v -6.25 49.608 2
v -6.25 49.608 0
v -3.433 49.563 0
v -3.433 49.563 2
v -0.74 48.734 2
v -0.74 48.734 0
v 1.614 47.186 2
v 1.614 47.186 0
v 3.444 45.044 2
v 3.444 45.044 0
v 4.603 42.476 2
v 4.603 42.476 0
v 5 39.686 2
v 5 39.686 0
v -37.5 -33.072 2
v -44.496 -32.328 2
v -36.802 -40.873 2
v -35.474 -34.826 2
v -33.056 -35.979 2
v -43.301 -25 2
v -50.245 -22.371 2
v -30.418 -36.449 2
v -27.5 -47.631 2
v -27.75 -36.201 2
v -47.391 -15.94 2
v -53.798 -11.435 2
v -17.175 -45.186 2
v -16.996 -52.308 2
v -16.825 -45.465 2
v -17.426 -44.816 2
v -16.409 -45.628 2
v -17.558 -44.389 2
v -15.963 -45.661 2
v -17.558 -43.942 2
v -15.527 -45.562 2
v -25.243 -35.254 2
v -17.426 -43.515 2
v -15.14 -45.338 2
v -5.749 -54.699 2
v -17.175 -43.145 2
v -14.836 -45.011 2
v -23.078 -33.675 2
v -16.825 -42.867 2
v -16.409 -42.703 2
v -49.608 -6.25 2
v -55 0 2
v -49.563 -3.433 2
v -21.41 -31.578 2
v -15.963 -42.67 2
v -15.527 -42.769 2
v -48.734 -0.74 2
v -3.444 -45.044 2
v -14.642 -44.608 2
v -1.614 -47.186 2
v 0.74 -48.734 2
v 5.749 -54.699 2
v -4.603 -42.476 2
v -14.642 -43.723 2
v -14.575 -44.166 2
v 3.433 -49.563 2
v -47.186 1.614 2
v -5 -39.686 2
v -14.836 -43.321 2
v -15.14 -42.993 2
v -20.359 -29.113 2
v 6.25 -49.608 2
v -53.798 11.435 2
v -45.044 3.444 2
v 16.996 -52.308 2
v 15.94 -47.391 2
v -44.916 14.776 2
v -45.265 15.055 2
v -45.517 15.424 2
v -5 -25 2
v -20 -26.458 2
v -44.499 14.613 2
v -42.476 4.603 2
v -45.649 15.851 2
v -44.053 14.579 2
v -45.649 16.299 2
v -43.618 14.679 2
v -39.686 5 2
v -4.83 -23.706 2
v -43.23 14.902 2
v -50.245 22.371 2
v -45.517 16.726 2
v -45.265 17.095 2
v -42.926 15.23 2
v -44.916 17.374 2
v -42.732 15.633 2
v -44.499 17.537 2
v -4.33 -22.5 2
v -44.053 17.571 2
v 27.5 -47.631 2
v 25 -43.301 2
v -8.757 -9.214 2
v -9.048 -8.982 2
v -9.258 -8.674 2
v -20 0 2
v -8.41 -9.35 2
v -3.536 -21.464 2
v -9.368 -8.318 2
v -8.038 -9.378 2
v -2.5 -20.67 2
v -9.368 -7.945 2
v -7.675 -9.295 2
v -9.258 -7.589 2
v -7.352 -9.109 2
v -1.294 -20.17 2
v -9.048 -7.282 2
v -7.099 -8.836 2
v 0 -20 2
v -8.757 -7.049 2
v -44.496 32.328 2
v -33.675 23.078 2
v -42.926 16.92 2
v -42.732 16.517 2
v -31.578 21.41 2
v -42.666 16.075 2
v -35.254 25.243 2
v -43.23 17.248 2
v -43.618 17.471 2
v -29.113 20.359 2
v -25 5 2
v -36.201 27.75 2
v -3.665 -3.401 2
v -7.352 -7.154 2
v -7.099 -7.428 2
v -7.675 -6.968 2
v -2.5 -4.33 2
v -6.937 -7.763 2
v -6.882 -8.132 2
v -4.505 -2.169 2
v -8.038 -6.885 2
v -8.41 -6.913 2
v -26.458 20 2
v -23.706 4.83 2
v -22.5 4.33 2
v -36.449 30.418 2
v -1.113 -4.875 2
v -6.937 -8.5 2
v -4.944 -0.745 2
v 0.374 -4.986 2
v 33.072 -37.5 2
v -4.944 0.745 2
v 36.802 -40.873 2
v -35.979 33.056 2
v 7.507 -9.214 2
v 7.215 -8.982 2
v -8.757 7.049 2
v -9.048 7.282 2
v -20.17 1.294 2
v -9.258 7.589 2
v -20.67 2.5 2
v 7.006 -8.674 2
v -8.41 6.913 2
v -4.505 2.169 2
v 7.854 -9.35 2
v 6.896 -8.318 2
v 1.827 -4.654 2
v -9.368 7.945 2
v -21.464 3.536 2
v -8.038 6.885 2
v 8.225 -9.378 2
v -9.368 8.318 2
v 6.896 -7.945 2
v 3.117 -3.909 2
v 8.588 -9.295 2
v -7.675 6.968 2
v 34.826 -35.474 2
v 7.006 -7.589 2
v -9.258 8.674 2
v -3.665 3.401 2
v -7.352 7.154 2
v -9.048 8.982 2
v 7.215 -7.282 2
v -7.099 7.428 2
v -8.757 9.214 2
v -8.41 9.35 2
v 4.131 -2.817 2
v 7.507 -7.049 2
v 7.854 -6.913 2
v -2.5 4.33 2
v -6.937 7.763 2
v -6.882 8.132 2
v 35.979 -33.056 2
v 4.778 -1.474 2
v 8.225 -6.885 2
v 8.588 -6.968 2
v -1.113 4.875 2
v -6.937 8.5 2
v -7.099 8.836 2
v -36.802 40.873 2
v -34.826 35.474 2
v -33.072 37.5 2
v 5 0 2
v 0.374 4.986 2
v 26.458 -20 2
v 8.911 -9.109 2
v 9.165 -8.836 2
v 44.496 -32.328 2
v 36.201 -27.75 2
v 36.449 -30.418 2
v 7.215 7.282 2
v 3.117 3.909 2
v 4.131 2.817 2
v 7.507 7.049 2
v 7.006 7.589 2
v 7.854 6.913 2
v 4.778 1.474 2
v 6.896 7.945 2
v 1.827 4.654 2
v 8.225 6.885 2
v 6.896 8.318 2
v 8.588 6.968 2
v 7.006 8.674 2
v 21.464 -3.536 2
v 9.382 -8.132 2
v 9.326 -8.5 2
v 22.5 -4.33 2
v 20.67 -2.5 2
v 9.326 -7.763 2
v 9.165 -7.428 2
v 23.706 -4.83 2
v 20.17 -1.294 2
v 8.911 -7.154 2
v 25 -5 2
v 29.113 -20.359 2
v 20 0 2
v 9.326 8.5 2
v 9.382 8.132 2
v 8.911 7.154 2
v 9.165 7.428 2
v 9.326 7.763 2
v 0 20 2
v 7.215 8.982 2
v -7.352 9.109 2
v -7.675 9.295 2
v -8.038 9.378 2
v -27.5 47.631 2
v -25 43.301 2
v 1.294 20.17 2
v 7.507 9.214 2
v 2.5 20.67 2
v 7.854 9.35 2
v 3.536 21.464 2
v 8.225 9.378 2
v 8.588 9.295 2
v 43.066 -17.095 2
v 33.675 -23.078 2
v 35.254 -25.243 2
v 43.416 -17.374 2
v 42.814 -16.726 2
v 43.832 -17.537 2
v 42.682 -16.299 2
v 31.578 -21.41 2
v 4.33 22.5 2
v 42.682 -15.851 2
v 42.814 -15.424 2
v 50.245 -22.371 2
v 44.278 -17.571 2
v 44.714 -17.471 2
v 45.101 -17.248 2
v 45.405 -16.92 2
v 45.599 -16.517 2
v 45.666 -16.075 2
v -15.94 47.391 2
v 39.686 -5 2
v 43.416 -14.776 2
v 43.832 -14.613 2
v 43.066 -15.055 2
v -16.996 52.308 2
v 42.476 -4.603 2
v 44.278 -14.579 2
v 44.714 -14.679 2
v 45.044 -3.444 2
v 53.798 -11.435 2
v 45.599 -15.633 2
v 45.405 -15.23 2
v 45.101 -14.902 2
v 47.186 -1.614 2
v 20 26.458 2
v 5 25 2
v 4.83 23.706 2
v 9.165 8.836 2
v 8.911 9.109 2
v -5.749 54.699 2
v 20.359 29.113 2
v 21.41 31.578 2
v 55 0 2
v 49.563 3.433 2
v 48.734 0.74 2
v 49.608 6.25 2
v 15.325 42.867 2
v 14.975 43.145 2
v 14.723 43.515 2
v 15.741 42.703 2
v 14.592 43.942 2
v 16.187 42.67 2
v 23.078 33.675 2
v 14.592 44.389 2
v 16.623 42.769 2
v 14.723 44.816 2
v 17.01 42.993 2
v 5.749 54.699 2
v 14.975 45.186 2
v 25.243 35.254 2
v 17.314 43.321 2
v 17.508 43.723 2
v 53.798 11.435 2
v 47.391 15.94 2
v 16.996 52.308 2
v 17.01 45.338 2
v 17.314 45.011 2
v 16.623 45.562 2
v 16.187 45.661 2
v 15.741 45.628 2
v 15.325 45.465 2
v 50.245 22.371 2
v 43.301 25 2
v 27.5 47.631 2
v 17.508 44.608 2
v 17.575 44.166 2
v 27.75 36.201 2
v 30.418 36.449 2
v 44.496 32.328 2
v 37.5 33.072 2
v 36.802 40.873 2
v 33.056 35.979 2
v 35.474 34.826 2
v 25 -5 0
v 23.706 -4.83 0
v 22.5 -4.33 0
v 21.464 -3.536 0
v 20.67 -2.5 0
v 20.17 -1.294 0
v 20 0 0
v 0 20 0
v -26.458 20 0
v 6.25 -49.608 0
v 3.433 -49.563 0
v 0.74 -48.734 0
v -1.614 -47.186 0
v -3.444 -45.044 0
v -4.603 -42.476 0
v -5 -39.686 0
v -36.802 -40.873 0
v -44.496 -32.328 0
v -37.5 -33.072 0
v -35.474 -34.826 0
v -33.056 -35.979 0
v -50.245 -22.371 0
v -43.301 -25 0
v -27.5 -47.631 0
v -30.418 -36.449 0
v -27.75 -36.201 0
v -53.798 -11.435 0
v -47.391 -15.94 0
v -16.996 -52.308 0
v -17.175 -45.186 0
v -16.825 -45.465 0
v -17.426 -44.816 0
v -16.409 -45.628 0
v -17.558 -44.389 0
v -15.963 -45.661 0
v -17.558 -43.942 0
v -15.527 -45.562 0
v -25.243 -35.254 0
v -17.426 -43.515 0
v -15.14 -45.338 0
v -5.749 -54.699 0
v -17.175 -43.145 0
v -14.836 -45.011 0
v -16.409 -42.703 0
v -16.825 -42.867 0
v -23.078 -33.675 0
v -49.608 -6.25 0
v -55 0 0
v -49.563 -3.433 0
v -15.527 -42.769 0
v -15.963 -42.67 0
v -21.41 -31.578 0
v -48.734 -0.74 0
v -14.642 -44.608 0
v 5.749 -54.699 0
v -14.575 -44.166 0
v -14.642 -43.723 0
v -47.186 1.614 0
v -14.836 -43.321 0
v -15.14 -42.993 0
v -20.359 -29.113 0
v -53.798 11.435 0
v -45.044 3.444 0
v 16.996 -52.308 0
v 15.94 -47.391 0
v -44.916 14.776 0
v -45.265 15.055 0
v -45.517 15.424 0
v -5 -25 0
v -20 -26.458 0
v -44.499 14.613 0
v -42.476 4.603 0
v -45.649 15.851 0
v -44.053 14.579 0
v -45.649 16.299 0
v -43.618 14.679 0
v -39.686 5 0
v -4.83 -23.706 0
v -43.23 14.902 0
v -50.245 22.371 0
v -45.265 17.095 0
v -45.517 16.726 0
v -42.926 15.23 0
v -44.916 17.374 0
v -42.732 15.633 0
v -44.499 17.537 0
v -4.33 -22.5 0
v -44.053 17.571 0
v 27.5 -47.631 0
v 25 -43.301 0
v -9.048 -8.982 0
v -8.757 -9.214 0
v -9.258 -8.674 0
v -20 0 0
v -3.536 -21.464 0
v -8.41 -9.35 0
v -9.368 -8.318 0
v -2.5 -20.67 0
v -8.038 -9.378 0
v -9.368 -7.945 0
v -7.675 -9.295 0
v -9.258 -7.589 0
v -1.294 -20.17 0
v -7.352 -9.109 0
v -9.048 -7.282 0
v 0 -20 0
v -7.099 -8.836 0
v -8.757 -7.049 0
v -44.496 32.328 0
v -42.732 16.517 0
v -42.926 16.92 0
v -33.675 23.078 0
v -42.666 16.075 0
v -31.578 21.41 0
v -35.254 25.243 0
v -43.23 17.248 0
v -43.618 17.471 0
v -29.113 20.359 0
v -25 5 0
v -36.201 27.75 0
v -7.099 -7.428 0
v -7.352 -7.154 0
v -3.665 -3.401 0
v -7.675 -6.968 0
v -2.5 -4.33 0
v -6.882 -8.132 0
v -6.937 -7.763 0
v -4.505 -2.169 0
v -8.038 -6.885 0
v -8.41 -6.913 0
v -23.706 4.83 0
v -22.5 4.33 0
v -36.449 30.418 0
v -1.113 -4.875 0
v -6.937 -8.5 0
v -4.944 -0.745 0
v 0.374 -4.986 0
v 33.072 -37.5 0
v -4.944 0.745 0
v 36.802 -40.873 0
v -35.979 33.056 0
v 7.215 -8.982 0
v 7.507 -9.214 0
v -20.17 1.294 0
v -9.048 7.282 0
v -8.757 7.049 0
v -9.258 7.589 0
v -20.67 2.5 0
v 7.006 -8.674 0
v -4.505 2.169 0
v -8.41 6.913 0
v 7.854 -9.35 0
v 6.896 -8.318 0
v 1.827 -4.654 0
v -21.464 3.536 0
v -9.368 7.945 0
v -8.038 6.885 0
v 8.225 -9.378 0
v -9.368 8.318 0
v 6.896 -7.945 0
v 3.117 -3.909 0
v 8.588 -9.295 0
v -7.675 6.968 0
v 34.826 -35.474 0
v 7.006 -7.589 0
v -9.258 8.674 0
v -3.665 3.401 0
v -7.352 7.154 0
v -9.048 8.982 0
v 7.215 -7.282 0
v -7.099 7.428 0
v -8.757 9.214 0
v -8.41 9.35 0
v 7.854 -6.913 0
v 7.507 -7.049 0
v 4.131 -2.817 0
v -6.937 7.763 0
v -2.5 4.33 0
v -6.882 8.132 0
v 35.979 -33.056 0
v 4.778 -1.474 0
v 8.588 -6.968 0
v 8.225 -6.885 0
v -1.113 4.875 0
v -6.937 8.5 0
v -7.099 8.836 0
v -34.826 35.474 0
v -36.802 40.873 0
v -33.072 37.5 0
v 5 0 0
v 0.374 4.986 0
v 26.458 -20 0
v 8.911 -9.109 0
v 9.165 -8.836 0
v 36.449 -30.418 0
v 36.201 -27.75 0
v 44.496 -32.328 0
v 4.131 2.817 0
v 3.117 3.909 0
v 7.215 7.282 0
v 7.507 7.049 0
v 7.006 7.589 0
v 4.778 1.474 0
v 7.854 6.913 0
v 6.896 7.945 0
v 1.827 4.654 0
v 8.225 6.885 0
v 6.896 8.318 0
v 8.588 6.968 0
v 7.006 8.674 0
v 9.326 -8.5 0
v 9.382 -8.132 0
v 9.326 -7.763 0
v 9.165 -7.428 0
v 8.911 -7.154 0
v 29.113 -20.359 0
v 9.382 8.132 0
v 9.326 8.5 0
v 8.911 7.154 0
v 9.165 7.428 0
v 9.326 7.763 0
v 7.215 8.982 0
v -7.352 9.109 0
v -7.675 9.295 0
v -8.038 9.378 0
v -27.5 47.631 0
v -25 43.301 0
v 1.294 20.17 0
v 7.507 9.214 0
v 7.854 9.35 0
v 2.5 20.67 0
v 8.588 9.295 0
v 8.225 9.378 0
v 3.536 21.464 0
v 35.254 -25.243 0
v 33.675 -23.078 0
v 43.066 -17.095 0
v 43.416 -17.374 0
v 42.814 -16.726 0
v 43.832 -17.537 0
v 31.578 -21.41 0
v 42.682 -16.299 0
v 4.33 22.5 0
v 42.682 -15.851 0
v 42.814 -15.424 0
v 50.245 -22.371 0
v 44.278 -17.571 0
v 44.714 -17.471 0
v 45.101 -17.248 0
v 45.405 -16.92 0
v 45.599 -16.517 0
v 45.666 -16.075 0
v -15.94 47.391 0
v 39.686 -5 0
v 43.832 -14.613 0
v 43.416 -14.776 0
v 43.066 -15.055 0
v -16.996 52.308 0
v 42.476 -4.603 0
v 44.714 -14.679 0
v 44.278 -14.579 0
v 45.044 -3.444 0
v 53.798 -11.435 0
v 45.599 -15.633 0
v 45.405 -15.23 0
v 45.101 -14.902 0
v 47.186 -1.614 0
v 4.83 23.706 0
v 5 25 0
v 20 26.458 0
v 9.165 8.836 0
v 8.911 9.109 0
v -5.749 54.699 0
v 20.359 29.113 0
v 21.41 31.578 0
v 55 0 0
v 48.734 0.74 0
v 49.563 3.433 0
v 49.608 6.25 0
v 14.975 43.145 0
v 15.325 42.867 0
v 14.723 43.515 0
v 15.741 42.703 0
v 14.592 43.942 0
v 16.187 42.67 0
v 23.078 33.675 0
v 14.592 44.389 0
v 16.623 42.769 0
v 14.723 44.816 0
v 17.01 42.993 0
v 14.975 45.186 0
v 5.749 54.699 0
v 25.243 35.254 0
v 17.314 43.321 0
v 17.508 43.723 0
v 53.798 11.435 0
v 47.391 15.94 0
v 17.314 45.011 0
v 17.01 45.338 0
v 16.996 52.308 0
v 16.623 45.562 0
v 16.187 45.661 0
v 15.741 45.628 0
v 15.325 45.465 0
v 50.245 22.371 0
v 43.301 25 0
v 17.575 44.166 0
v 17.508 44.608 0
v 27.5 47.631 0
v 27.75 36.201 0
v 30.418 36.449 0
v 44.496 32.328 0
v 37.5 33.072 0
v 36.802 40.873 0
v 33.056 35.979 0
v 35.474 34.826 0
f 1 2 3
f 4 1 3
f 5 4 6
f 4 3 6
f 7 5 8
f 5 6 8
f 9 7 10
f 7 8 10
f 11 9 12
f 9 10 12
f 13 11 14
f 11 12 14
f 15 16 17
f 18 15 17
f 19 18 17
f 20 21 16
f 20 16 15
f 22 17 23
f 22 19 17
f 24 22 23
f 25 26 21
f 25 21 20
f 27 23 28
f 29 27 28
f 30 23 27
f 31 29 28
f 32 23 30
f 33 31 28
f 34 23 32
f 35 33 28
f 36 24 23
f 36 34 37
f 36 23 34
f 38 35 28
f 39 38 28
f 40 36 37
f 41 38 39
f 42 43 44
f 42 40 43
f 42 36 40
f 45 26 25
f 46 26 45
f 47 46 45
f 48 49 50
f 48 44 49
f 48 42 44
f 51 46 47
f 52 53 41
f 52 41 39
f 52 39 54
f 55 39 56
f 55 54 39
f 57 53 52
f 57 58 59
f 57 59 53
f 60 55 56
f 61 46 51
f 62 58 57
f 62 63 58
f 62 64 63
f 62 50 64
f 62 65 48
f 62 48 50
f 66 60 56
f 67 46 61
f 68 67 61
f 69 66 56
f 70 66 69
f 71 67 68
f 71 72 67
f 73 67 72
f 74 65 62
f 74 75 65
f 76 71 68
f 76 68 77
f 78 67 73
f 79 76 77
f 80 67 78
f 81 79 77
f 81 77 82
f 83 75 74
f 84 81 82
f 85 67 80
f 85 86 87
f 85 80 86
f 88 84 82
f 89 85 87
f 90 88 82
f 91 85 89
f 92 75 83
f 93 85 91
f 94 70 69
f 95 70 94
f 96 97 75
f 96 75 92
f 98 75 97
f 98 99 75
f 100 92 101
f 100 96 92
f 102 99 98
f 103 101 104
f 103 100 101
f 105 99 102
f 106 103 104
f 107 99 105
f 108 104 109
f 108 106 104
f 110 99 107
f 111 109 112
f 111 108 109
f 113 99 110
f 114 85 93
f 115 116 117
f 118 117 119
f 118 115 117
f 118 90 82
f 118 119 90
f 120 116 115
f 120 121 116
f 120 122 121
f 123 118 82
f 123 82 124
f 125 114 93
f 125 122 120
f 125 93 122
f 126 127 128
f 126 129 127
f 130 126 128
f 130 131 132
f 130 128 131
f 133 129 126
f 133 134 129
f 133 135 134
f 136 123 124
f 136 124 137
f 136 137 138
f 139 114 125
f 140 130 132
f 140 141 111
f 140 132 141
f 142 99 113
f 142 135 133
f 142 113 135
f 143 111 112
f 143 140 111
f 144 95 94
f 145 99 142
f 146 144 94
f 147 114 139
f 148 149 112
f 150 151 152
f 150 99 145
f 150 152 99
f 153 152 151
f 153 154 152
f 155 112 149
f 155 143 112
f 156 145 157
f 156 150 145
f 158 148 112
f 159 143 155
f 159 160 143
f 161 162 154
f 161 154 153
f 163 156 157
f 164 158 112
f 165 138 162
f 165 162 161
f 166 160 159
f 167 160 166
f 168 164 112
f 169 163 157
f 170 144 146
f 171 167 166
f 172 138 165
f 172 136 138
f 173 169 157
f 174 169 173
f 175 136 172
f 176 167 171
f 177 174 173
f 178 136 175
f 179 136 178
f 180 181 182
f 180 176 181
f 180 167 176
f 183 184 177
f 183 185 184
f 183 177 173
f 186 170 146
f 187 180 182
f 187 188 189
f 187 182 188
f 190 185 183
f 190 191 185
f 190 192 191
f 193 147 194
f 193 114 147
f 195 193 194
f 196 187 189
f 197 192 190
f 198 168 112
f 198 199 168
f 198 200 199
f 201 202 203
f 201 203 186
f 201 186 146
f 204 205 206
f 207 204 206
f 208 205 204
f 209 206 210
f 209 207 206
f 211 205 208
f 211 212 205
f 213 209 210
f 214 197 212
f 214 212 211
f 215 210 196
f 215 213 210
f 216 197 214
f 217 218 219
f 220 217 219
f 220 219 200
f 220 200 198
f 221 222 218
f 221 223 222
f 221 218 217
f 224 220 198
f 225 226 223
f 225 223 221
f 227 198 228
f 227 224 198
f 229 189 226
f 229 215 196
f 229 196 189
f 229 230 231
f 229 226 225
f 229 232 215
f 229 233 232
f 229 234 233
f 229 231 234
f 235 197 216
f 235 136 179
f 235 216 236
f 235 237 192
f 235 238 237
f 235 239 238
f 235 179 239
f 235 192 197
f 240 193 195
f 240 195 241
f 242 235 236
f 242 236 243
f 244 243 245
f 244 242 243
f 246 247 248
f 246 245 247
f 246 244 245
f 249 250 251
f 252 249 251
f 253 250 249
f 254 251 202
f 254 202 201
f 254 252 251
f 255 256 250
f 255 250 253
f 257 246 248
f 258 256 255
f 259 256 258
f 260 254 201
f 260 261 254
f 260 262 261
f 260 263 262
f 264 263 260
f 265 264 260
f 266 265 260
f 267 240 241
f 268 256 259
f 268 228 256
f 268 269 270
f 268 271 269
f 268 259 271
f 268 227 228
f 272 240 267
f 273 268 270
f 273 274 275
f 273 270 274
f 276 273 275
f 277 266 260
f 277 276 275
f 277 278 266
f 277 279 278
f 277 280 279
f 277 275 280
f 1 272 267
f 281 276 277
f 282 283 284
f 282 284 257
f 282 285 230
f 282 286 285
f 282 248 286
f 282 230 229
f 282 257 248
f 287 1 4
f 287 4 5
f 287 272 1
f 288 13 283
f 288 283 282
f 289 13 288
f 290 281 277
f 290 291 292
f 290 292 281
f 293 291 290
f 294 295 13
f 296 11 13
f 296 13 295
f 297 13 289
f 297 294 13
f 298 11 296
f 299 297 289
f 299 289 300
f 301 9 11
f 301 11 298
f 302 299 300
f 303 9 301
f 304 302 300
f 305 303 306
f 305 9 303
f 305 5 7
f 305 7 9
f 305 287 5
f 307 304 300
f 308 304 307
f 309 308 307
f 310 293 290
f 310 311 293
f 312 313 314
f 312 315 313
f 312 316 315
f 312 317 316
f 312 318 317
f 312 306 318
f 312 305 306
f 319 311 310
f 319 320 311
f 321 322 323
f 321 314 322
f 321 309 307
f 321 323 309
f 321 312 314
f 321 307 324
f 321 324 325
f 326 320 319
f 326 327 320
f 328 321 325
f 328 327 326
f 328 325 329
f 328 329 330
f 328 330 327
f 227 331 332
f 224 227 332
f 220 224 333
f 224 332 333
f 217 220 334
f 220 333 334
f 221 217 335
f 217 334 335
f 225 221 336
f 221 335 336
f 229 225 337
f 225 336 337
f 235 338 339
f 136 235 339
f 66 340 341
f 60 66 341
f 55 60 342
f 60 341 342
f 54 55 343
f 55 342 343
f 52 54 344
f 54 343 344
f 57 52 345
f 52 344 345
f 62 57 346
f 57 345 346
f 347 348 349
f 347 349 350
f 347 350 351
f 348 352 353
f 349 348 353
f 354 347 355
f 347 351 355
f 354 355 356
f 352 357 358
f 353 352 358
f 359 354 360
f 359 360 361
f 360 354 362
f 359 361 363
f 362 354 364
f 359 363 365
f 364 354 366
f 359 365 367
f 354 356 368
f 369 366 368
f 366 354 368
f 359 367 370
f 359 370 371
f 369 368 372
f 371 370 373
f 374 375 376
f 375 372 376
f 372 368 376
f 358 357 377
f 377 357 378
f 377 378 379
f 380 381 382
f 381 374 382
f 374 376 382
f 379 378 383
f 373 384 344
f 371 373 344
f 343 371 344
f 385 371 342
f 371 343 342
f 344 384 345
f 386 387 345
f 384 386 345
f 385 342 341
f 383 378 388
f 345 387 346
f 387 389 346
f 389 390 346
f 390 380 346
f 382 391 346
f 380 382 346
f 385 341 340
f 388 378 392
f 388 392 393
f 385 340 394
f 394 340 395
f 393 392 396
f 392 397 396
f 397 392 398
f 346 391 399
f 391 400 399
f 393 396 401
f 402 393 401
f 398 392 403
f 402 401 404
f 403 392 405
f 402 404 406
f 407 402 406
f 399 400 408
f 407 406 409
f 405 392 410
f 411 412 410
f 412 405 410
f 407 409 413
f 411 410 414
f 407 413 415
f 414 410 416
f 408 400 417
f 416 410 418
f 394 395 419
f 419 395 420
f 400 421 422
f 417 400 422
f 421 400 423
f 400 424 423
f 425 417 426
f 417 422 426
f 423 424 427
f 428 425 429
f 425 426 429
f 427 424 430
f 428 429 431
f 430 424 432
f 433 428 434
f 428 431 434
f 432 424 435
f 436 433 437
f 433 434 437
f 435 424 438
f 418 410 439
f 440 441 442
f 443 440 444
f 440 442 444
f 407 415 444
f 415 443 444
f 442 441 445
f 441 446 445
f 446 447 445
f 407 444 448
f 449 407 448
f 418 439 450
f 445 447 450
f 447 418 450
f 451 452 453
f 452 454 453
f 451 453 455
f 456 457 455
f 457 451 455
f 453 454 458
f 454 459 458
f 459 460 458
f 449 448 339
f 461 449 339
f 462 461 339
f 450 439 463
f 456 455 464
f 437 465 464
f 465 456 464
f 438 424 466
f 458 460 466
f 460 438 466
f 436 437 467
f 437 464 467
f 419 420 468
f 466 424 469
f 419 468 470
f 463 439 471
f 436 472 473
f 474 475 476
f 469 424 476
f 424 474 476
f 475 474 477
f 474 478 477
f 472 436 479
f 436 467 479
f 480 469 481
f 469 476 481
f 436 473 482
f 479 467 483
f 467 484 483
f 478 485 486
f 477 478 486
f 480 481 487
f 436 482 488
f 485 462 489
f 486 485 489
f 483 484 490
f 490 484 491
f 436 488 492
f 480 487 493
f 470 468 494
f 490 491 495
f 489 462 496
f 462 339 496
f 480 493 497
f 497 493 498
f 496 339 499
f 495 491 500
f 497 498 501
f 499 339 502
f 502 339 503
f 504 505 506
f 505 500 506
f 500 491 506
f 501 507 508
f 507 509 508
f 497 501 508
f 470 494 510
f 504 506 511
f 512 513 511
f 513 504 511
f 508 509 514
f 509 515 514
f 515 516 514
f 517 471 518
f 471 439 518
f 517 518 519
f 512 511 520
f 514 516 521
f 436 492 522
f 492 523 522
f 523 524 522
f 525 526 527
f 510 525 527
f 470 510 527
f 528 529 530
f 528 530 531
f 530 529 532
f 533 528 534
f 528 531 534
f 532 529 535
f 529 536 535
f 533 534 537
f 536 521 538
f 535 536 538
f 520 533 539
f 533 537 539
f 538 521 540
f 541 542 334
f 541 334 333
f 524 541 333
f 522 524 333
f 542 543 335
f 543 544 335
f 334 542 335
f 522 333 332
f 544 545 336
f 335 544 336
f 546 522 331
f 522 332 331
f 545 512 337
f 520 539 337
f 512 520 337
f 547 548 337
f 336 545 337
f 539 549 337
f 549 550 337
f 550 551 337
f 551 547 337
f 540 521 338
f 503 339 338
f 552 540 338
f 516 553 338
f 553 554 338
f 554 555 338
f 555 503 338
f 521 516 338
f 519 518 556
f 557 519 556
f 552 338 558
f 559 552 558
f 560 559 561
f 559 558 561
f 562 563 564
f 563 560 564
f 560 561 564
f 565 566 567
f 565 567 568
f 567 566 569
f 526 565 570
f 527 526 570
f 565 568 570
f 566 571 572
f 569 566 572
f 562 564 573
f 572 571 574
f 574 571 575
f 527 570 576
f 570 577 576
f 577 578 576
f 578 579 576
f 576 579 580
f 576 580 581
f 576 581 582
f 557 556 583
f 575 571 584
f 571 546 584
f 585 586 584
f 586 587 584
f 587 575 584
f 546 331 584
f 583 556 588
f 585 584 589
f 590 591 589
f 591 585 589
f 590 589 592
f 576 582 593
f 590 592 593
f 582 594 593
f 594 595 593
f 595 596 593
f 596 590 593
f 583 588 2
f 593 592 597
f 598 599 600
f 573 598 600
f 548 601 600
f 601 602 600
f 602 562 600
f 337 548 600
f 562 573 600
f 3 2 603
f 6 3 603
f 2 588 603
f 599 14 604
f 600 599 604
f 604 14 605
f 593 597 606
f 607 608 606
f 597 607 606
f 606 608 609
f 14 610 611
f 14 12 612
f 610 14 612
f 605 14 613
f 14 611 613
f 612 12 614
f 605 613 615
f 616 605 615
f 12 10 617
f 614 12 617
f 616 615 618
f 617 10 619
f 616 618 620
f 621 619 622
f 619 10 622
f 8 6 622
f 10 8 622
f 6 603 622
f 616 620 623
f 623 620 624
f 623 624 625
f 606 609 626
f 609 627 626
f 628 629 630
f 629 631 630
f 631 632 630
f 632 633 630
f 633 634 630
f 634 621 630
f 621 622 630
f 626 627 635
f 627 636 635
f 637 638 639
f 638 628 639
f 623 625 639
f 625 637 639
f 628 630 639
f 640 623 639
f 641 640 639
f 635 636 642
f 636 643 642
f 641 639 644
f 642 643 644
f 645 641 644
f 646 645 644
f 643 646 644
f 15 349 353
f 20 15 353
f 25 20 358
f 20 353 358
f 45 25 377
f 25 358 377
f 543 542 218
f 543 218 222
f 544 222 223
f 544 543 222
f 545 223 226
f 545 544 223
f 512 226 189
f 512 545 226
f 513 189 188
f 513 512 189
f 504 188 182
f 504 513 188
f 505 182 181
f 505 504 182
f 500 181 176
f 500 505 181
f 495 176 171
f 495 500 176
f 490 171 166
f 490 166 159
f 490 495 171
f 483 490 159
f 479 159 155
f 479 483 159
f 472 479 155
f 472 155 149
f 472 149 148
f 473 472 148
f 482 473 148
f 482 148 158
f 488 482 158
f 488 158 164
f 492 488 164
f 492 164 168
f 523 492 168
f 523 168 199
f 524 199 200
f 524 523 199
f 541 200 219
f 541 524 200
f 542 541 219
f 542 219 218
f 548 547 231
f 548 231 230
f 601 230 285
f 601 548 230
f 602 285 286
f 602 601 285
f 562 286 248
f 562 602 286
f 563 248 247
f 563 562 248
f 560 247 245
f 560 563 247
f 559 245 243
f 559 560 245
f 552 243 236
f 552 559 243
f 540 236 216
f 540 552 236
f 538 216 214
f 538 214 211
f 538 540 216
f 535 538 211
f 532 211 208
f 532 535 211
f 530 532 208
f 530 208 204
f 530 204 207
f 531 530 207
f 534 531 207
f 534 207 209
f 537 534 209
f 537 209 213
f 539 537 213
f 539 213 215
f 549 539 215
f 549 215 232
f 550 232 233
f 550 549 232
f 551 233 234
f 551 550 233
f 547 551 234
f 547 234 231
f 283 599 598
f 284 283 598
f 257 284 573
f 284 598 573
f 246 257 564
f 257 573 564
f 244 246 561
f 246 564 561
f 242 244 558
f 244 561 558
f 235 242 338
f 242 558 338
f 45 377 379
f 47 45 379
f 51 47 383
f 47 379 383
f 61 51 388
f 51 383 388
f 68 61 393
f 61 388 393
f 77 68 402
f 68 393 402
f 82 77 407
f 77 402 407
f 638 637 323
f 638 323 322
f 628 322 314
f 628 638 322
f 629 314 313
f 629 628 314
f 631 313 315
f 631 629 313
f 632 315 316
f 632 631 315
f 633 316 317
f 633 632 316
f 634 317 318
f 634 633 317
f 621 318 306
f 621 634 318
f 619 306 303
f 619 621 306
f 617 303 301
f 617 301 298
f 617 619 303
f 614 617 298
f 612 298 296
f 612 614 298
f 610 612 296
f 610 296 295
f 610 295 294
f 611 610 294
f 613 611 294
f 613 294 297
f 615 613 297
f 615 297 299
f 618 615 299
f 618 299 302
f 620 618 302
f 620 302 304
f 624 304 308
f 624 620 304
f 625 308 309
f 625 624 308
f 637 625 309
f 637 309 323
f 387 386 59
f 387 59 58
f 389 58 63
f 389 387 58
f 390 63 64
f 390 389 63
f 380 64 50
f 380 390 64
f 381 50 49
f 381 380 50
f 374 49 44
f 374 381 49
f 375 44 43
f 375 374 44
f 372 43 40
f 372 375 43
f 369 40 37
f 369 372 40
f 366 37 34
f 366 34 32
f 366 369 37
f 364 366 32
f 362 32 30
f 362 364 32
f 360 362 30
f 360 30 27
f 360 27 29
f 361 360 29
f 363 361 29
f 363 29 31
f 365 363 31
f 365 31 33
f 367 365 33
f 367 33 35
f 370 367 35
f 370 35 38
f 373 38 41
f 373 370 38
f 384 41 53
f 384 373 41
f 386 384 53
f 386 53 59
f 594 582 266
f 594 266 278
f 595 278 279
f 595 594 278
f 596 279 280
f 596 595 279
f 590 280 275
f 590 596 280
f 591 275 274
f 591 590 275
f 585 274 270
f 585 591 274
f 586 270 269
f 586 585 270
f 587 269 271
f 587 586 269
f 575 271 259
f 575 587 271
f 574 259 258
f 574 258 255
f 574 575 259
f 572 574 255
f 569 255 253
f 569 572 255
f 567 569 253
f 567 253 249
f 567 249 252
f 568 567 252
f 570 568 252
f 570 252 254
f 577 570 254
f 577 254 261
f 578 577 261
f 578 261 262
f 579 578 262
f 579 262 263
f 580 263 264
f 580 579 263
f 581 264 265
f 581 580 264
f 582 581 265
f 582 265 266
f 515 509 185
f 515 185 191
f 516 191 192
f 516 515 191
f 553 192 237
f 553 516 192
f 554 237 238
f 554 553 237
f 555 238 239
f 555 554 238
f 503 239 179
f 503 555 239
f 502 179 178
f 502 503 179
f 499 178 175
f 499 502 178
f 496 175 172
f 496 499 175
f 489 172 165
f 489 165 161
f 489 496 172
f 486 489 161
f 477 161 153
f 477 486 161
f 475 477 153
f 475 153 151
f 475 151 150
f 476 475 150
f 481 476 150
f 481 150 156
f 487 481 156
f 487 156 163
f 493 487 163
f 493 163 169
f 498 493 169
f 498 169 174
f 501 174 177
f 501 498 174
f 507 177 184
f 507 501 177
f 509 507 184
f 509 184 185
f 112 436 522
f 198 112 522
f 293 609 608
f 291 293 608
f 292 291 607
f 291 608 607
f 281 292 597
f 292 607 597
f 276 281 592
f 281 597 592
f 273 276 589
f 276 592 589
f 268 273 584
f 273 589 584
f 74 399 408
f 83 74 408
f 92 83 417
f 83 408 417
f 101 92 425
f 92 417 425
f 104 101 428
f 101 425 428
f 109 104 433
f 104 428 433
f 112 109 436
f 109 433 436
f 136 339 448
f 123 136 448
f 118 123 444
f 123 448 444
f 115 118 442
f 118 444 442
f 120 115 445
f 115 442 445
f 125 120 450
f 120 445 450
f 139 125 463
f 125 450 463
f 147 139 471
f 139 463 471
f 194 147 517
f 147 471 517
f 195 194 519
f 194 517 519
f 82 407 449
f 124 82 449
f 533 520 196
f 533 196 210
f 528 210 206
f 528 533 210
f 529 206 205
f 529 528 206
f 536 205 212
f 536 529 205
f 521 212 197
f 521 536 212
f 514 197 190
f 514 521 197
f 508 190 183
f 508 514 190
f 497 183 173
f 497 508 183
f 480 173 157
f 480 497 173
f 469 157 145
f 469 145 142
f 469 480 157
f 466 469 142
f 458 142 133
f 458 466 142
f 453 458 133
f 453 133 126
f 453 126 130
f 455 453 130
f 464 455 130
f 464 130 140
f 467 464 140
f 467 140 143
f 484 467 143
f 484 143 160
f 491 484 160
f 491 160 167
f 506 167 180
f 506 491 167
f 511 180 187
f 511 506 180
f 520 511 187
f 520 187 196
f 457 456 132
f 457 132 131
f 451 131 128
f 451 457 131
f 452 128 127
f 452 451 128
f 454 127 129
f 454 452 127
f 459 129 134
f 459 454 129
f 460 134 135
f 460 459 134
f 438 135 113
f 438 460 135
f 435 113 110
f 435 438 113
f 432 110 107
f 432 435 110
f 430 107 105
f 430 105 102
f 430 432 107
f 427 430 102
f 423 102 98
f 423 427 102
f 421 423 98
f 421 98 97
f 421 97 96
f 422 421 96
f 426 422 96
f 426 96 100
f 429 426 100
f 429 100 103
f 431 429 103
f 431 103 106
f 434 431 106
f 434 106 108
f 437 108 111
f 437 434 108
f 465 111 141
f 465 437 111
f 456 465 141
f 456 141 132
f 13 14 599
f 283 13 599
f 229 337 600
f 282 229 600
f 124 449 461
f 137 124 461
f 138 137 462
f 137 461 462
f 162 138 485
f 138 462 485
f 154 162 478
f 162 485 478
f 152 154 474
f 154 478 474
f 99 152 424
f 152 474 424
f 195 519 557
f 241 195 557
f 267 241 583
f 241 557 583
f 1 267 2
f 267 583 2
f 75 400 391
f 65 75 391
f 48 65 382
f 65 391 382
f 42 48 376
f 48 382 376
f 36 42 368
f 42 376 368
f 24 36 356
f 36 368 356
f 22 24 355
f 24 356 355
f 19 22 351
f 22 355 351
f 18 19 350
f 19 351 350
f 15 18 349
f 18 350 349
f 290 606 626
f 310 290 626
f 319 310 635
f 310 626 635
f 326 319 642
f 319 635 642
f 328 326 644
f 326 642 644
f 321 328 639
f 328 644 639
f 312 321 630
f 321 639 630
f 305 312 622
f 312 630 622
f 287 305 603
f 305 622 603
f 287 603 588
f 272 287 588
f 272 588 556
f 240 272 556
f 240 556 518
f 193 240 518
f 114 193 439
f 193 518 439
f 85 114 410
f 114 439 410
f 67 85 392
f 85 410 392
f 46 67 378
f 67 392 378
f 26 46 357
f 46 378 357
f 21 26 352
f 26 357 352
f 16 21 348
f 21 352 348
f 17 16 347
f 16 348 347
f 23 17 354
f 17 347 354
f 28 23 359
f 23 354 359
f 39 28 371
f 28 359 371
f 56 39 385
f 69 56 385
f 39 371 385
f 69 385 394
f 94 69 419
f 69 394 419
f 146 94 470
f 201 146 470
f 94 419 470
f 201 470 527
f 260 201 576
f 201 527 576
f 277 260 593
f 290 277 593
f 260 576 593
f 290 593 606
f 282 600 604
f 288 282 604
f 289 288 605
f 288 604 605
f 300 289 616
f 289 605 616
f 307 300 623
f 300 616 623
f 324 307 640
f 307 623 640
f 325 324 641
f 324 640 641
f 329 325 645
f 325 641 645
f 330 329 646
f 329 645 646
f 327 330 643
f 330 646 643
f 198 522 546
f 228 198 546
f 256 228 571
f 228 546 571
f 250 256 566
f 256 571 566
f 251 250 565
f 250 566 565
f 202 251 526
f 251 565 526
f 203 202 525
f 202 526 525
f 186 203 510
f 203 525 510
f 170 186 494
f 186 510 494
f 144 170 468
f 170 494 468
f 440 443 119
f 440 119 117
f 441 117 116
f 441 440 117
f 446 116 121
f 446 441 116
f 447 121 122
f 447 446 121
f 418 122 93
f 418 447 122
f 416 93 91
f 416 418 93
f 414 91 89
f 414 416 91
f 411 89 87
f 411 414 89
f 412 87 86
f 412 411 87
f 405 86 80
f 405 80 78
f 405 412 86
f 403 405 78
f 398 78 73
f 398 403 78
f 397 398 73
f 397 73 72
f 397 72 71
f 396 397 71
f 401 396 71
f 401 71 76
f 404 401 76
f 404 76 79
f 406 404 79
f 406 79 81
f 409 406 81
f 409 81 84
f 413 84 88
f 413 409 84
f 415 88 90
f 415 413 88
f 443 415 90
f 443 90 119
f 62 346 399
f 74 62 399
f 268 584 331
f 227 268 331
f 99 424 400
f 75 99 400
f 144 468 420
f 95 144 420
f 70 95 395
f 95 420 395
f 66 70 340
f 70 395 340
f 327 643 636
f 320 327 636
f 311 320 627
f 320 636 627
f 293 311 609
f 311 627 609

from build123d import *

# Parameters (mm, degrees)
SKETCH_1_R      = 55
SKETCH_1_R_2    = 1.5
SKETCH_1_R_3    = 1.25
SKETCH_1_R_4    = 5
EXTRUDE_1_DEPTH = 2


with BuildPart() as part:
    # 草图1 → 凸台-拉伸1 (new body)
    with BuildSketch(Plane.XY):
        Circle(SKETCH_1_R)
        with Locations((-16.074946736, -44.165553177)):
            Circle(SKETCH_1_R_2, mode=Mode.SUBTRACT)
        with BuildLine():
            Line((-39.686269666, 5), (-25, 5))
            ThreePointArc((-25, 5), (-21.464466094, 3.535533906), (-20, 0))
            Line((-20, 0), (-20, -26.457513111))
            ThreePointArc((-20, -26.457513111), (-26.464466094, -35.811656578), (-37.5, -33.071891388))
            ThreePointArc((-37.5, -33.071891388), (-45.571891388, -20.571891388), (-49.607837082, -6.25))
            ThreePointArc((-49.607837082, -6.25), (-47.186269666, 1.614378278), (-39.686269666, 5))
        make_face(mode=Mode.SUBTRACT)
        with Locations((-8.131727984, -8.131727984)):
            Circle(SKETCH_1_R_3, mode=Mode.SUBTRACT)
        with BuildLine():
            ThreePointArc((-5, -25), (-3.535533906, -21.464466094), (0, -20))
            Line((0, -20), (26.457513111, -20))
            ThreePointArc((26.457513111, -20), (35.811656578, -26.464466094), (33.071891388, -37.5))
            ThreePointArc((33.071891388, -37.5), (20.571891388, -45.571891388), (6.25, -49.607837082))
            ThreePointArc((6.25, -49.607837082), (-1.614378278, -47.186269666), (-5, -39.686269666))
            Line((-5, -39.686269666), (-5, -25))
        make_face(mode=Mode.SUBTRACT)
        with Locations((8.131727984, -8.131727984)):
            Circle(SKETCH_1_R_3, mode=Mode.SUBTRACT)
        with Locations((44.165553177, -16.074946736)):
            Circle(SKETCH_1_R_2, mode=Mode.SUBTRACT)
        with Locations((-44.165553177, 16.074946736)):
            Circle(SKETCH_1_R_2, mode=Mode.SUBTRACT)
        with Locations((-8.131727984, 8.131727984)):
            Circle(SKETCH_1_R_3, mode=Mode.SUBTRACT)
        with BuildLine():
            ThreePointArc((5, 25), (3.535533906, 21.464466094), (0, 20))
            Line((0, 20), (-26.457513111, 20))
            ThreePointArc((-26.457513111, 20), (-35.811656578, 26.464466094), (-33.071891388, 37.5))
            ThreePointArc((-33.071891388, 37.5), (-20.571891388, 45.571891388), (-6.25, 49.607837082))
            ThreePointArc((-6.25, 49.607837082), (1.614378278, 47.186269666), (5, 39.686269666))
            Line((5, 39.686269666), (5, 25))
        make_face(mode=Mode.SUBTRACT)
        Circle(SKETCH_1_R_4, mode=Mode.SUBTRACT)
        with Locations((8.131727984, 8.131727984)):
            Circle(SKETCH_1_R_3, mode=Mode.SUBTRACT)
        with BuildLine():
            ThreePointArc((25, -5), (21.464466094, -3.535533906), (20, 0))
            Line((20, 0), (20, 26.457513111))
            ThreePointArc((20, 26.457513111), (26.464466094, 35.811656578), (37.5, 33.071891388))
            ThreePointArc((37.5, 33.071891388), (45.571891388, 20.571891388), (49.607837082, 6.25))
            ThreePointArc((49.607837082, 6.25), (47.186269666, -1.614378278), (39.686269666, -5))
            Line((39.686269666, -5), (25, -5))
        make_face(mode=Mode.SUBTRACT)
        with Locations((16.074946736, 44.165553177)):
            Circle(SKETCH_1_R_2, mode=Mode.SUBTRACT)
    extrude(amount=EXTRUDE_1_DEPTH)


solid = part.part
